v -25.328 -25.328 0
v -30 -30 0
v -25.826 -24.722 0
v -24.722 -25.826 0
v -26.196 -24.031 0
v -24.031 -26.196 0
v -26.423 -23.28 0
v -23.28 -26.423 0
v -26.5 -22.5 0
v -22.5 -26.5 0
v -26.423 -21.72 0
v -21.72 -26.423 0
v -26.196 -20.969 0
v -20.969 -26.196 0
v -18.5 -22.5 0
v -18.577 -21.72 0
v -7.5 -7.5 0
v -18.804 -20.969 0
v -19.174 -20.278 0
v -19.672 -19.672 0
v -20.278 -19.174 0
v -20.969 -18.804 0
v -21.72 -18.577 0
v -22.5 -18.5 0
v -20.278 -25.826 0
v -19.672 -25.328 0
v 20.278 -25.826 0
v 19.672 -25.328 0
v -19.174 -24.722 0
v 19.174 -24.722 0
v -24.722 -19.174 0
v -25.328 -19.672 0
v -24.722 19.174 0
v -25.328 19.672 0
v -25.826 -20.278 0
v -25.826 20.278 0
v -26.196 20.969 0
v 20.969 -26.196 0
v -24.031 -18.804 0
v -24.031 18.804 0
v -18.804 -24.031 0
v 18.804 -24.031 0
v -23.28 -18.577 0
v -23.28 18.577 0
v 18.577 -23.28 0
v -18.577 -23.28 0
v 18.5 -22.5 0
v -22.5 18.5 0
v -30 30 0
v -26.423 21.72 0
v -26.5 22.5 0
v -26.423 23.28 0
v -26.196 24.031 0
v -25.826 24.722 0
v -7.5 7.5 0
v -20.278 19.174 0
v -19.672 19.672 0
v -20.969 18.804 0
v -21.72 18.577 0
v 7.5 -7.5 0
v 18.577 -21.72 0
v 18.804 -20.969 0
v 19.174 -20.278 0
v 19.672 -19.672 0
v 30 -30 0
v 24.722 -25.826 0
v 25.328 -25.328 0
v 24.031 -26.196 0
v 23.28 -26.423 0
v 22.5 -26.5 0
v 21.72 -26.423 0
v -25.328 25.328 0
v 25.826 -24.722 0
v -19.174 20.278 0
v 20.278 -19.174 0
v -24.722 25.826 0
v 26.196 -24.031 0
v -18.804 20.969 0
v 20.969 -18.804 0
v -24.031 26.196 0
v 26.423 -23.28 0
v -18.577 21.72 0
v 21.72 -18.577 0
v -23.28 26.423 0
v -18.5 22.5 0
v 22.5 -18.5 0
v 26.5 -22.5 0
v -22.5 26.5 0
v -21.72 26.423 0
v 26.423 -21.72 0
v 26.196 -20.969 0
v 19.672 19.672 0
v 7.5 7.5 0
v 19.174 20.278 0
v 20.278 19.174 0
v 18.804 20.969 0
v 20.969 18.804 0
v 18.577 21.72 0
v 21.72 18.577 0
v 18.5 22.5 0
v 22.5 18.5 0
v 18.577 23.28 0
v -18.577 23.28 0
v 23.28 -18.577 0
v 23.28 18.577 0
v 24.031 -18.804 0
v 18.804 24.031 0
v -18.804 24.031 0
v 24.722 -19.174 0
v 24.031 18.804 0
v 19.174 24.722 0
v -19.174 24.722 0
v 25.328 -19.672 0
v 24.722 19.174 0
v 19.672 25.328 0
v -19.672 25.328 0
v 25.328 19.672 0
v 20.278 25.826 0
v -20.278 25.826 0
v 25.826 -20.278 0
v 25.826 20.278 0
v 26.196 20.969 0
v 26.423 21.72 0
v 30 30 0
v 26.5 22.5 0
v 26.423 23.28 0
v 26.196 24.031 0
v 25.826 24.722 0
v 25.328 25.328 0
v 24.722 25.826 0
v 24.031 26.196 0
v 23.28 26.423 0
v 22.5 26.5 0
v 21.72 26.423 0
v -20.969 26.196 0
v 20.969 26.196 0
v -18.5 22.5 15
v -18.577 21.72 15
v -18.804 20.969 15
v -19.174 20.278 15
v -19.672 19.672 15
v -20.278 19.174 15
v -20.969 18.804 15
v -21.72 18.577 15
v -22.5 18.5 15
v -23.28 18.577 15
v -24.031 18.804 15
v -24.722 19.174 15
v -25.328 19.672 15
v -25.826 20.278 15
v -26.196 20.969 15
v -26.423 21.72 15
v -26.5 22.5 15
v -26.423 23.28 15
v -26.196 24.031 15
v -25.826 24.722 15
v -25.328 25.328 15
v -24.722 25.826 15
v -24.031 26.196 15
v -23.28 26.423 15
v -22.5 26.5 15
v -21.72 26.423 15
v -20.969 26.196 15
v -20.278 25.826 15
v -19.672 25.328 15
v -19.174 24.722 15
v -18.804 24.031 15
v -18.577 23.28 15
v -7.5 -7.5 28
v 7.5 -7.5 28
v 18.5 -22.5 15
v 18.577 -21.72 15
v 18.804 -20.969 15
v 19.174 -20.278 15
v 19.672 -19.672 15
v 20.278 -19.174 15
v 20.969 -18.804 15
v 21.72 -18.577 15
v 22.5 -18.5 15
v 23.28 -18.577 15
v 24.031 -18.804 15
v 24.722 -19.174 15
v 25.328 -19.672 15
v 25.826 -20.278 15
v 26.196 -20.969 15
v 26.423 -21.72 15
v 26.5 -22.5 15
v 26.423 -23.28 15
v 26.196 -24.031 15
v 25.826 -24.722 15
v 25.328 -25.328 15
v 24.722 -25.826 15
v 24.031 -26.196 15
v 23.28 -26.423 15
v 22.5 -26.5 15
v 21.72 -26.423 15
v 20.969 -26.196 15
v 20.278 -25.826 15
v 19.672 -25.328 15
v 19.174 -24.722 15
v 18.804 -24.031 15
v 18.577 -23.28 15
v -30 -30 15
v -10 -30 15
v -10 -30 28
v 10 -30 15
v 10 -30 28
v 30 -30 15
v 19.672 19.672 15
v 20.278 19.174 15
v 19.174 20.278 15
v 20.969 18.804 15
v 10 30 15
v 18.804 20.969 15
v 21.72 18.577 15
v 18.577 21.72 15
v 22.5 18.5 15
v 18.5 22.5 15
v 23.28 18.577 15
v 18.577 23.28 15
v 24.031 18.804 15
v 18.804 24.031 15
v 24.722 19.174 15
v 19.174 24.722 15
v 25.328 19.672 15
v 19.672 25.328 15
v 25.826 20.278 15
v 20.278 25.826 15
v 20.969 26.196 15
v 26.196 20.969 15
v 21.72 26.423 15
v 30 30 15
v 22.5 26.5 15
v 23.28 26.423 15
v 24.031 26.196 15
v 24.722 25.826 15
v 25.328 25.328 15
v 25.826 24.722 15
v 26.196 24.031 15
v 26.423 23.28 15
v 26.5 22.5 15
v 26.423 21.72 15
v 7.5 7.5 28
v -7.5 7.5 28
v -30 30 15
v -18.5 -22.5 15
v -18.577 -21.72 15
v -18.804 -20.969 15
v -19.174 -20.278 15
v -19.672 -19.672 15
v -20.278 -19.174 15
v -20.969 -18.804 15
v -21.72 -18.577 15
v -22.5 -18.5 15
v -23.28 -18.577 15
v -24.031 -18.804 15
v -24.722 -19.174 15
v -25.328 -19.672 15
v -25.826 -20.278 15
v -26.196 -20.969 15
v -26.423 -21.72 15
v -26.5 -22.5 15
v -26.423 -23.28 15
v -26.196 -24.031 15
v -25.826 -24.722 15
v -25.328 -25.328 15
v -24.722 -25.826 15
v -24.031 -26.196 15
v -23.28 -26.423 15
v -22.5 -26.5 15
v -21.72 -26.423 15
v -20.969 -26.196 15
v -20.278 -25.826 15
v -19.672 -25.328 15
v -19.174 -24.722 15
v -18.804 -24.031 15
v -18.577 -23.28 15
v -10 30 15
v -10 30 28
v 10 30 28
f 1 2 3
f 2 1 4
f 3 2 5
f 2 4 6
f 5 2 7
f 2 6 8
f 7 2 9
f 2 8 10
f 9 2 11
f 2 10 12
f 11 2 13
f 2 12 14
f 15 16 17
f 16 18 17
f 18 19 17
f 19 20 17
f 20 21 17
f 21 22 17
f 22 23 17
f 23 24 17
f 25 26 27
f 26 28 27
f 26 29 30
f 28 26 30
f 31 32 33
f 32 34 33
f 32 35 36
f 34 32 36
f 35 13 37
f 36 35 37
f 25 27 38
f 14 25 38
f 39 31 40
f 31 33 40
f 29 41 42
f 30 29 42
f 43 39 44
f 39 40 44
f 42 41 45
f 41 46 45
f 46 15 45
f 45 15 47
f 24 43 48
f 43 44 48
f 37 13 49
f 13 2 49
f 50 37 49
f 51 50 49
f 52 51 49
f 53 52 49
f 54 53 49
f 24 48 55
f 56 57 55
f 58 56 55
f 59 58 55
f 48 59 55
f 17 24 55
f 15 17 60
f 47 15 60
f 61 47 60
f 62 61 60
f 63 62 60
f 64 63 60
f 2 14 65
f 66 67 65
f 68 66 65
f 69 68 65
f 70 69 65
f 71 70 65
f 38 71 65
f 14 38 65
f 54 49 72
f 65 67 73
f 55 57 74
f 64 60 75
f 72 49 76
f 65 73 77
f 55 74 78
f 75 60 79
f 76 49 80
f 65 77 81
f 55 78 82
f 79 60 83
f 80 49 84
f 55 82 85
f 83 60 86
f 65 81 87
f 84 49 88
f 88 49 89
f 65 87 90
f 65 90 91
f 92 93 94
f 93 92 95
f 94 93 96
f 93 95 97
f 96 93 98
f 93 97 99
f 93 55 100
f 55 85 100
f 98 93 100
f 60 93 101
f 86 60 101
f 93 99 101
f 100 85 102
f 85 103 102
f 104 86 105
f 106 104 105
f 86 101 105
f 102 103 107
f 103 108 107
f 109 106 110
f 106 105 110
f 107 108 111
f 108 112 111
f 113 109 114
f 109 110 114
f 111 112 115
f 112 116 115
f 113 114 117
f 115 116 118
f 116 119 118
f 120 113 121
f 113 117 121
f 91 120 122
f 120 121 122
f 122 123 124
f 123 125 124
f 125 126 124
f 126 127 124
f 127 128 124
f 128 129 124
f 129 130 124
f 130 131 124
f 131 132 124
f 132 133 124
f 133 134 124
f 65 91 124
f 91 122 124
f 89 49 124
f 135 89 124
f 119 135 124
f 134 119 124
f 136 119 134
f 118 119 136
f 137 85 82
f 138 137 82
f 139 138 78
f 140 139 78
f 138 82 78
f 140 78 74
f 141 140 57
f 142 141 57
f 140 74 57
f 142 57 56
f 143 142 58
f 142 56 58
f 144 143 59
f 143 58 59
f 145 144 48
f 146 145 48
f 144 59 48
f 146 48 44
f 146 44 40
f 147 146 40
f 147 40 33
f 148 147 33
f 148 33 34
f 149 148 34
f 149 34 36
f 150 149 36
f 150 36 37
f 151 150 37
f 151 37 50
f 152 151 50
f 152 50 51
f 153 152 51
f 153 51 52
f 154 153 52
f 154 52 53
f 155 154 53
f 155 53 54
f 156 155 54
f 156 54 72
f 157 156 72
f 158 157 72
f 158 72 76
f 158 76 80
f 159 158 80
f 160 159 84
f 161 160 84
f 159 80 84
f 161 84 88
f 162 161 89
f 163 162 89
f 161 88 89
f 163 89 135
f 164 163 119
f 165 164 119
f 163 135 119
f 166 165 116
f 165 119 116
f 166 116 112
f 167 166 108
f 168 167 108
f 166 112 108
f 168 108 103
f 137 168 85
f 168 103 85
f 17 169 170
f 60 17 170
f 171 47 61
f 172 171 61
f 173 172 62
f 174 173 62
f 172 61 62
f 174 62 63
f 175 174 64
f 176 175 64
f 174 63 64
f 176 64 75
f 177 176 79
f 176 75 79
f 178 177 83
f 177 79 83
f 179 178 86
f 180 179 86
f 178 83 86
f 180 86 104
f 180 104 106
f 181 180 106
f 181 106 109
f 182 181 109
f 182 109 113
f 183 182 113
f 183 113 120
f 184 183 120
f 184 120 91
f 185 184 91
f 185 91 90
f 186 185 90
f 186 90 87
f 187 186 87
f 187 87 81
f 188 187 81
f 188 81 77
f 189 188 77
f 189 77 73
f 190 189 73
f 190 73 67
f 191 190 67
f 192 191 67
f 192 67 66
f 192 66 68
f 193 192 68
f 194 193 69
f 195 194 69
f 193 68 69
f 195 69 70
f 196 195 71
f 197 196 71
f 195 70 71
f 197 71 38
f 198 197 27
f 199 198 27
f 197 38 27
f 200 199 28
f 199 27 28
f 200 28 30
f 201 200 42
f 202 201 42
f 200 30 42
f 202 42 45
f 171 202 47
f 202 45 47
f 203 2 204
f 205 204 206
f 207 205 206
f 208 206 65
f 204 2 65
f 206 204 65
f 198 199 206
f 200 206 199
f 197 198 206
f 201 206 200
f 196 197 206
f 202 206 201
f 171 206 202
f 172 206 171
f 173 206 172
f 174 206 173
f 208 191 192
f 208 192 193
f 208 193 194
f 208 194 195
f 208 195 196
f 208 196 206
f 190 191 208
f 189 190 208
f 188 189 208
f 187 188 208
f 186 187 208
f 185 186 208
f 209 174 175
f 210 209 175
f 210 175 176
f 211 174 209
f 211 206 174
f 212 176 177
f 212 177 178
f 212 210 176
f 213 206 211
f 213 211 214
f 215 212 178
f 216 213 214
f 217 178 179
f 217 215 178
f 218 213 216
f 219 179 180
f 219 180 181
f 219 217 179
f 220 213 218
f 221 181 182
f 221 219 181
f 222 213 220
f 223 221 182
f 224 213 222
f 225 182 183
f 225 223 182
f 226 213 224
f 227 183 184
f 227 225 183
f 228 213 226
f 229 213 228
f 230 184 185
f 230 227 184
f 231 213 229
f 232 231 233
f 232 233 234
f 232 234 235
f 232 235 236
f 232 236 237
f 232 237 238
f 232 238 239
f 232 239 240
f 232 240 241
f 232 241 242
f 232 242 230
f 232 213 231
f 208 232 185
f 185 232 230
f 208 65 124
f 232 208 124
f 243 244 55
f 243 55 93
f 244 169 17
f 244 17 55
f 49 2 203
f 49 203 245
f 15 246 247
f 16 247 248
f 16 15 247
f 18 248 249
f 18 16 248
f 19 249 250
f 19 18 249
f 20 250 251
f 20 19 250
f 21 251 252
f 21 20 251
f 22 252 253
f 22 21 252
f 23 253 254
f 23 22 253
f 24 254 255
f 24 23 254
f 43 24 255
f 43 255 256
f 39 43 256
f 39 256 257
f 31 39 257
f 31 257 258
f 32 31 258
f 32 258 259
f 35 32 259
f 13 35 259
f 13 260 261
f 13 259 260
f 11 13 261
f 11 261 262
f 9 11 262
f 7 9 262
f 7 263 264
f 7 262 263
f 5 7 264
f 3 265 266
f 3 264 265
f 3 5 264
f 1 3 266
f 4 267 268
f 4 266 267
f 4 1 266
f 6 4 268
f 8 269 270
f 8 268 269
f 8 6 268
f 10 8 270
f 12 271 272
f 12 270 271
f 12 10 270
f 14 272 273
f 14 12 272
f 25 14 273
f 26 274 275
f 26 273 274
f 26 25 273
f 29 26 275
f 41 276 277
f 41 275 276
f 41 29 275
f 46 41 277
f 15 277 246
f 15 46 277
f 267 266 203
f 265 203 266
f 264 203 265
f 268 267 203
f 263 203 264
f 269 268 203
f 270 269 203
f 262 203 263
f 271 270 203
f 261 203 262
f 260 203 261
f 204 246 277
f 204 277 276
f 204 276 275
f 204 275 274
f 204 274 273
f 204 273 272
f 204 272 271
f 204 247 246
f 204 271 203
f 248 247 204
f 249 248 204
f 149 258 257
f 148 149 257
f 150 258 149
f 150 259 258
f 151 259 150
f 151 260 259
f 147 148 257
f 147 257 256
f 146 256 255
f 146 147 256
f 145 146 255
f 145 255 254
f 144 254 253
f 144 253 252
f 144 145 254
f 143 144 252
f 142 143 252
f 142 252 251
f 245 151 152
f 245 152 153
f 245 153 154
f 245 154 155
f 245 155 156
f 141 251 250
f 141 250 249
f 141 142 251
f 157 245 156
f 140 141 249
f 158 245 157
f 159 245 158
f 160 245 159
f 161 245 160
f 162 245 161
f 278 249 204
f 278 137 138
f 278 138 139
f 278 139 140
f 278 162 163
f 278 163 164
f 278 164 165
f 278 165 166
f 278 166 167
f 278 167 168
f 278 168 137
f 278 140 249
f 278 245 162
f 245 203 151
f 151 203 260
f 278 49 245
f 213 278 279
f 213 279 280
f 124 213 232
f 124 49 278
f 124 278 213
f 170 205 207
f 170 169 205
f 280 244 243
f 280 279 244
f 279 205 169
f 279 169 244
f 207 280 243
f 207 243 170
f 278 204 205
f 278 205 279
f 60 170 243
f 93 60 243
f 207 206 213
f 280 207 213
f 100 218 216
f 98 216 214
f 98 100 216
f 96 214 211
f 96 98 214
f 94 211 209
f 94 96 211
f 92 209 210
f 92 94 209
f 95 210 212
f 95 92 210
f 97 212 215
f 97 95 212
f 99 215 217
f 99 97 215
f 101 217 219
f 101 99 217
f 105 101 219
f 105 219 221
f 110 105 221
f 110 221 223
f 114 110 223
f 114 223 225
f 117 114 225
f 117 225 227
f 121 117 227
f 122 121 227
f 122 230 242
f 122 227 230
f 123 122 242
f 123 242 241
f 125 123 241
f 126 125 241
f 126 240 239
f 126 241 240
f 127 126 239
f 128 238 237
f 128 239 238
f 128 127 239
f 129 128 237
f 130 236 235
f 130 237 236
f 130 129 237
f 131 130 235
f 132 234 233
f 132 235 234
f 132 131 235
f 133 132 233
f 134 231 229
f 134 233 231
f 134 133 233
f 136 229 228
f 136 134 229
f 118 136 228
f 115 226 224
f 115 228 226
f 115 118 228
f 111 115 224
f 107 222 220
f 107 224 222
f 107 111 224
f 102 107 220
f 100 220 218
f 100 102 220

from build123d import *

# Parameters (mm, degrees)
SKETCH_1_W               = 60
SKETCH_1_H               = 60
EXTRUDE_1_DEPTH          = 15
SKETCH_2_W               = 20
SKETCH_2_H               = 60
EXTRUDE_2_DEPTH          = 13
SKETCH_3_W               = 15
SKETCH_3_H               = 15
CUT_EXTRUDE_1_DEPTH      = 51.833060109
SKETCH_5_R               = 4
CUT_EXTRUDE_3_DEPTH      = 51.833060109
MIRROR_2_COPY_1_SKETCH_R = 4
MIRROR_2_COPY_1_DEPTH    = 51.833060109


with BuildPart() as part:
    # Эскиз1 → Бобышка-Вытянуть1 (new body)
    with BuildSketch(Plane.XY):
        Rectangle(SKETCH_1_W, SKETCH_1_H)
    extrude(amount=EXTRUDE_1_DEPTH)

    # Эскиз2 → Бобышка-Вытянуть2 (add)
    with BuildSketch(Plane.XY.offset(15)):
        Rectangle(SKETCH_2_W, SKETCH_2_H)
    extrude(amount=EXTRUDE_2_DEPTH)

    # Эскиз3 → Вырез-Вытянуть1 (cut, through all)
    with BuildSketch(Plane.XY.offset(28)):
        Rectangle(SKETCH_3_W, SKETCH_3_H)
    extrude(amount=-CUT_EXTRUDE_1_DEPTH, mode=Mode.SUBTRACT)

    # Эскиз5 → Вырез-Вытянуть3 (cut, through all)
    with BuildSketch(Plane(origin=(0, 0, 0), x_dir=(-1, 0, 0), z_dir=(0, 0, -1))):
        with Locations((-22.5, -22.5)):
            Circle(SKETCH_5_R)
    cut_extrude_3 = extrude(amount=-CUT_EXTRUDE_3_DEPTH, mode=Mode.SUBTRACT)

    # Зеркальное отражение1: Вырез-Вытянуть3 across plane
    add(cut_extrude_3.mirror(Plane.ZX), mode=Mode.SUBTRACT)

    # Зеркальное отражение2: Вырез-Вытянуть3 across plane
    add(cut_extrude_3.mirror(Plane(origin=(0, 0, 0), x_dir=(0, 0, 1), z_dir=(1, 0, 0))), mode=Mode.SUBTRACT)

    # Зеркальное отражение2 copy 1 sketch → Зеркальное отражение2 copy 1 (cut, through all)
    with BuildSketch(Plane(origin=(0, 0, 0), x_dir=(1, 0, 0), z_dir=(0, 0, -1))):
        with Locations((-22.5, -22.5)):
            Circle(MIRROR_2_COPY_1_SKETCH_R)
    extrude(amount=-MIRROR_2_COPY_1_DEPTH, mode=Mode.SUBTRACT)


solid = part.part
